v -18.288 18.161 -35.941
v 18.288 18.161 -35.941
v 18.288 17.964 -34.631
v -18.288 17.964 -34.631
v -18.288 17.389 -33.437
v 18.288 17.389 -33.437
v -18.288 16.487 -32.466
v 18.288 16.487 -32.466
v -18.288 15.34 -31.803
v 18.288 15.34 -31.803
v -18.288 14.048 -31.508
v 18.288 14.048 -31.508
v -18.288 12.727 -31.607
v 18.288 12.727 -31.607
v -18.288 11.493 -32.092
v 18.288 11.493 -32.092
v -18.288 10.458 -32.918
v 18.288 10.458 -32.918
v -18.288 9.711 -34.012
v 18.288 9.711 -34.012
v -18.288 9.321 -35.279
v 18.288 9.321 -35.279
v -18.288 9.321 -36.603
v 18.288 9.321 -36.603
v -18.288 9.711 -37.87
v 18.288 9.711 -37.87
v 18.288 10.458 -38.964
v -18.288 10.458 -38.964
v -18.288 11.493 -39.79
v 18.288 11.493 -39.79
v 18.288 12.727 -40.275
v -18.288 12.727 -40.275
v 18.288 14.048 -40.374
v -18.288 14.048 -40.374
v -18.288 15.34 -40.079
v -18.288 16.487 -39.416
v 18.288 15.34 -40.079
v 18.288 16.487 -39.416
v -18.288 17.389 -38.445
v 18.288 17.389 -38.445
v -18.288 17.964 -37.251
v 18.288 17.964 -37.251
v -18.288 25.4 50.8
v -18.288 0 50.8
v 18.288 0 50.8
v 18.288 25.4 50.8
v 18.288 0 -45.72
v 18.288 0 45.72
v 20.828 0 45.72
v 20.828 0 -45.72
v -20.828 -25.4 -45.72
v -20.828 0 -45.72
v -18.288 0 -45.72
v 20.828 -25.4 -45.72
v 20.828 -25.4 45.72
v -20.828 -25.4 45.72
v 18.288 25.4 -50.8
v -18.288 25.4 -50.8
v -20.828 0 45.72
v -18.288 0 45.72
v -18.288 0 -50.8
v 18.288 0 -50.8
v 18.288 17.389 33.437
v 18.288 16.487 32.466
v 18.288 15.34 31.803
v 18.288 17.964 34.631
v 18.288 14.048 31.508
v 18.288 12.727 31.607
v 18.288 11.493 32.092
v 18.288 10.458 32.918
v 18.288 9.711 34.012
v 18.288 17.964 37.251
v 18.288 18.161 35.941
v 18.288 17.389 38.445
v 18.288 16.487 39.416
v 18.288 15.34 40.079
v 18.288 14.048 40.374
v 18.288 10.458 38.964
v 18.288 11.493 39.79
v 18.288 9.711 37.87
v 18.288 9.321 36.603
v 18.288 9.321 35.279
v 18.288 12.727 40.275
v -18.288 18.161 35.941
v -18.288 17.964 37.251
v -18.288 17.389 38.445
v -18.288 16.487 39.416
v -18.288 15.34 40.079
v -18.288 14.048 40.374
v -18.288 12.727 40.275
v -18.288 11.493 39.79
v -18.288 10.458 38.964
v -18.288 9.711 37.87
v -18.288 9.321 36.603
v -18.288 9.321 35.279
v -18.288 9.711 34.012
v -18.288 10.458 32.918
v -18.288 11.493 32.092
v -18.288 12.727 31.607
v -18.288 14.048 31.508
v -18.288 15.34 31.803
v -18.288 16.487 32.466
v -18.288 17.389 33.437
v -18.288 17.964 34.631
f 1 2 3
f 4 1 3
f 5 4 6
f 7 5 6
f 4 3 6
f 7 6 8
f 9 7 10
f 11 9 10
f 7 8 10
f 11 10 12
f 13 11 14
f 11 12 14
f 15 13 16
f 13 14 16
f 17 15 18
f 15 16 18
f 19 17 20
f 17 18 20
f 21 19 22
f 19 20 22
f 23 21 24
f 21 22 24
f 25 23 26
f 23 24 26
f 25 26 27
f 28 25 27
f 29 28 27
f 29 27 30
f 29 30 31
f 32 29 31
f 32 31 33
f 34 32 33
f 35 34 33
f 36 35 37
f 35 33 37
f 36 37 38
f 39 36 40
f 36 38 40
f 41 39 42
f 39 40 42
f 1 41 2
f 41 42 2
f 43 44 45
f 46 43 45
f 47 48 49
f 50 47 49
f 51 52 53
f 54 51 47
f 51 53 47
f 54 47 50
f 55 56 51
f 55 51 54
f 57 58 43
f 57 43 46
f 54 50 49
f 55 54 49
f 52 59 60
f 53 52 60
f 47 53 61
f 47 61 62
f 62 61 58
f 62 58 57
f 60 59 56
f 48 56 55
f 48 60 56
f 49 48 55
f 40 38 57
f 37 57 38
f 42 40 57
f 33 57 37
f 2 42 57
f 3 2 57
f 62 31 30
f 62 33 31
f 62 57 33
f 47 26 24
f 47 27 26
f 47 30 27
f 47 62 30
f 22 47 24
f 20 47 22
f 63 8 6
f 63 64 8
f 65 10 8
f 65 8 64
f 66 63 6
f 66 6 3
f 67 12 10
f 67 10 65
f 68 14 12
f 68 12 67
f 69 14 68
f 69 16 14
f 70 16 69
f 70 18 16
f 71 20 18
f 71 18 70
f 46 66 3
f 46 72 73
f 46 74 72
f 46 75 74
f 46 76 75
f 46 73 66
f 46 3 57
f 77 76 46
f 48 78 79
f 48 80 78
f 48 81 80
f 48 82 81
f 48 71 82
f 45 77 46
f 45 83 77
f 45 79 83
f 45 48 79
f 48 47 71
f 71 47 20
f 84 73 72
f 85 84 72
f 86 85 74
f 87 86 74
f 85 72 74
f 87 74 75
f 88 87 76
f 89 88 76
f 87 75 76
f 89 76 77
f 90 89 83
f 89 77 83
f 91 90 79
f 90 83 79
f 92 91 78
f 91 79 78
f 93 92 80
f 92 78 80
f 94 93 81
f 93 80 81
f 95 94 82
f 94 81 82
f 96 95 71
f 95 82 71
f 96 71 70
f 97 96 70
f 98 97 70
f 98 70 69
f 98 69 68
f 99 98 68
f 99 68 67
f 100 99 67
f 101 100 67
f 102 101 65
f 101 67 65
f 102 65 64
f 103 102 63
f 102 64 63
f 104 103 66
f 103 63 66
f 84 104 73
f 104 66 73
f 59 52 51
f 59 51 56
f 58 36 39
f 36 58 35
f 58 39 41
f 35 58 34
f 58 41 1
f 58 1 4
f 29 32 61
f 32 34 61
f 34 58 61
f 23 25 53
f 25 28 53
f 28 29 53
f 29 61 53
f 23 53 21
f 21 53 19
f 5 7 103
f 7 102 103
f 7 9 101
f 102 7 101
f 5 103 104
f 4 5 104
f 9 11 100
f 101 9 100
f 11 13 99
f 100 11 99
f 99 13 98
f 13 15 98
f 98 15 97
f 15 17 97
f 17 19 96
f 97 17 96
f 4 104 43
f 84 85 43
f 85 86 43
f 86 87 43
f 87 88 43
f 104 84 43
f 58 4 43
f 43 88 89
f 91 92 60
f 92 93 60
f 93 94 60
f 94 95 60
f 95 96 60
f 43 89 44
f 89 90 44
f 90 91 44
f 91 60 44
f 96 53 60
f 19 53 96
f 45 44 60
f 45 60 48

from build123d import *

# Parameters (mm, degrees)
F0_W     = 41.656
F0_H     = 91.44
F1_DEPTH = 25.4
F2_W     = 36.576
F2_H     = 101.6
F3_DEPTH = 25.4
F4_R     = 4.445
F5_DEPTH = 36.576


with BuildPart() as f1:
    # F0 (on Front) → F1 (new body)
    with BuildSketch(Plane.XZ):
        Rectangle(F0_W, F0_H)
    extrude(amount=F1_DEPTH)

    # F2 (on Front) → F3 (join)
    with BuildSketch(Plane.XZ):
        Rectangle(F2_W, F2_H)
    extrude(amount=-F3_DEPTH)

    # F4 (on face) → F5 (cut, through all)
    with BuildSketch(Plane.YZ.offset(18.288)):
        with Locations((13.716, 35.941)):
            Circle(F4_R)
        with Locations((13.716, -35.941)):
            Circle(F4_R)
    extrude(amount=-F5_DEPTH, mode=Mode.SUBTRACT)


solid = f1.part
